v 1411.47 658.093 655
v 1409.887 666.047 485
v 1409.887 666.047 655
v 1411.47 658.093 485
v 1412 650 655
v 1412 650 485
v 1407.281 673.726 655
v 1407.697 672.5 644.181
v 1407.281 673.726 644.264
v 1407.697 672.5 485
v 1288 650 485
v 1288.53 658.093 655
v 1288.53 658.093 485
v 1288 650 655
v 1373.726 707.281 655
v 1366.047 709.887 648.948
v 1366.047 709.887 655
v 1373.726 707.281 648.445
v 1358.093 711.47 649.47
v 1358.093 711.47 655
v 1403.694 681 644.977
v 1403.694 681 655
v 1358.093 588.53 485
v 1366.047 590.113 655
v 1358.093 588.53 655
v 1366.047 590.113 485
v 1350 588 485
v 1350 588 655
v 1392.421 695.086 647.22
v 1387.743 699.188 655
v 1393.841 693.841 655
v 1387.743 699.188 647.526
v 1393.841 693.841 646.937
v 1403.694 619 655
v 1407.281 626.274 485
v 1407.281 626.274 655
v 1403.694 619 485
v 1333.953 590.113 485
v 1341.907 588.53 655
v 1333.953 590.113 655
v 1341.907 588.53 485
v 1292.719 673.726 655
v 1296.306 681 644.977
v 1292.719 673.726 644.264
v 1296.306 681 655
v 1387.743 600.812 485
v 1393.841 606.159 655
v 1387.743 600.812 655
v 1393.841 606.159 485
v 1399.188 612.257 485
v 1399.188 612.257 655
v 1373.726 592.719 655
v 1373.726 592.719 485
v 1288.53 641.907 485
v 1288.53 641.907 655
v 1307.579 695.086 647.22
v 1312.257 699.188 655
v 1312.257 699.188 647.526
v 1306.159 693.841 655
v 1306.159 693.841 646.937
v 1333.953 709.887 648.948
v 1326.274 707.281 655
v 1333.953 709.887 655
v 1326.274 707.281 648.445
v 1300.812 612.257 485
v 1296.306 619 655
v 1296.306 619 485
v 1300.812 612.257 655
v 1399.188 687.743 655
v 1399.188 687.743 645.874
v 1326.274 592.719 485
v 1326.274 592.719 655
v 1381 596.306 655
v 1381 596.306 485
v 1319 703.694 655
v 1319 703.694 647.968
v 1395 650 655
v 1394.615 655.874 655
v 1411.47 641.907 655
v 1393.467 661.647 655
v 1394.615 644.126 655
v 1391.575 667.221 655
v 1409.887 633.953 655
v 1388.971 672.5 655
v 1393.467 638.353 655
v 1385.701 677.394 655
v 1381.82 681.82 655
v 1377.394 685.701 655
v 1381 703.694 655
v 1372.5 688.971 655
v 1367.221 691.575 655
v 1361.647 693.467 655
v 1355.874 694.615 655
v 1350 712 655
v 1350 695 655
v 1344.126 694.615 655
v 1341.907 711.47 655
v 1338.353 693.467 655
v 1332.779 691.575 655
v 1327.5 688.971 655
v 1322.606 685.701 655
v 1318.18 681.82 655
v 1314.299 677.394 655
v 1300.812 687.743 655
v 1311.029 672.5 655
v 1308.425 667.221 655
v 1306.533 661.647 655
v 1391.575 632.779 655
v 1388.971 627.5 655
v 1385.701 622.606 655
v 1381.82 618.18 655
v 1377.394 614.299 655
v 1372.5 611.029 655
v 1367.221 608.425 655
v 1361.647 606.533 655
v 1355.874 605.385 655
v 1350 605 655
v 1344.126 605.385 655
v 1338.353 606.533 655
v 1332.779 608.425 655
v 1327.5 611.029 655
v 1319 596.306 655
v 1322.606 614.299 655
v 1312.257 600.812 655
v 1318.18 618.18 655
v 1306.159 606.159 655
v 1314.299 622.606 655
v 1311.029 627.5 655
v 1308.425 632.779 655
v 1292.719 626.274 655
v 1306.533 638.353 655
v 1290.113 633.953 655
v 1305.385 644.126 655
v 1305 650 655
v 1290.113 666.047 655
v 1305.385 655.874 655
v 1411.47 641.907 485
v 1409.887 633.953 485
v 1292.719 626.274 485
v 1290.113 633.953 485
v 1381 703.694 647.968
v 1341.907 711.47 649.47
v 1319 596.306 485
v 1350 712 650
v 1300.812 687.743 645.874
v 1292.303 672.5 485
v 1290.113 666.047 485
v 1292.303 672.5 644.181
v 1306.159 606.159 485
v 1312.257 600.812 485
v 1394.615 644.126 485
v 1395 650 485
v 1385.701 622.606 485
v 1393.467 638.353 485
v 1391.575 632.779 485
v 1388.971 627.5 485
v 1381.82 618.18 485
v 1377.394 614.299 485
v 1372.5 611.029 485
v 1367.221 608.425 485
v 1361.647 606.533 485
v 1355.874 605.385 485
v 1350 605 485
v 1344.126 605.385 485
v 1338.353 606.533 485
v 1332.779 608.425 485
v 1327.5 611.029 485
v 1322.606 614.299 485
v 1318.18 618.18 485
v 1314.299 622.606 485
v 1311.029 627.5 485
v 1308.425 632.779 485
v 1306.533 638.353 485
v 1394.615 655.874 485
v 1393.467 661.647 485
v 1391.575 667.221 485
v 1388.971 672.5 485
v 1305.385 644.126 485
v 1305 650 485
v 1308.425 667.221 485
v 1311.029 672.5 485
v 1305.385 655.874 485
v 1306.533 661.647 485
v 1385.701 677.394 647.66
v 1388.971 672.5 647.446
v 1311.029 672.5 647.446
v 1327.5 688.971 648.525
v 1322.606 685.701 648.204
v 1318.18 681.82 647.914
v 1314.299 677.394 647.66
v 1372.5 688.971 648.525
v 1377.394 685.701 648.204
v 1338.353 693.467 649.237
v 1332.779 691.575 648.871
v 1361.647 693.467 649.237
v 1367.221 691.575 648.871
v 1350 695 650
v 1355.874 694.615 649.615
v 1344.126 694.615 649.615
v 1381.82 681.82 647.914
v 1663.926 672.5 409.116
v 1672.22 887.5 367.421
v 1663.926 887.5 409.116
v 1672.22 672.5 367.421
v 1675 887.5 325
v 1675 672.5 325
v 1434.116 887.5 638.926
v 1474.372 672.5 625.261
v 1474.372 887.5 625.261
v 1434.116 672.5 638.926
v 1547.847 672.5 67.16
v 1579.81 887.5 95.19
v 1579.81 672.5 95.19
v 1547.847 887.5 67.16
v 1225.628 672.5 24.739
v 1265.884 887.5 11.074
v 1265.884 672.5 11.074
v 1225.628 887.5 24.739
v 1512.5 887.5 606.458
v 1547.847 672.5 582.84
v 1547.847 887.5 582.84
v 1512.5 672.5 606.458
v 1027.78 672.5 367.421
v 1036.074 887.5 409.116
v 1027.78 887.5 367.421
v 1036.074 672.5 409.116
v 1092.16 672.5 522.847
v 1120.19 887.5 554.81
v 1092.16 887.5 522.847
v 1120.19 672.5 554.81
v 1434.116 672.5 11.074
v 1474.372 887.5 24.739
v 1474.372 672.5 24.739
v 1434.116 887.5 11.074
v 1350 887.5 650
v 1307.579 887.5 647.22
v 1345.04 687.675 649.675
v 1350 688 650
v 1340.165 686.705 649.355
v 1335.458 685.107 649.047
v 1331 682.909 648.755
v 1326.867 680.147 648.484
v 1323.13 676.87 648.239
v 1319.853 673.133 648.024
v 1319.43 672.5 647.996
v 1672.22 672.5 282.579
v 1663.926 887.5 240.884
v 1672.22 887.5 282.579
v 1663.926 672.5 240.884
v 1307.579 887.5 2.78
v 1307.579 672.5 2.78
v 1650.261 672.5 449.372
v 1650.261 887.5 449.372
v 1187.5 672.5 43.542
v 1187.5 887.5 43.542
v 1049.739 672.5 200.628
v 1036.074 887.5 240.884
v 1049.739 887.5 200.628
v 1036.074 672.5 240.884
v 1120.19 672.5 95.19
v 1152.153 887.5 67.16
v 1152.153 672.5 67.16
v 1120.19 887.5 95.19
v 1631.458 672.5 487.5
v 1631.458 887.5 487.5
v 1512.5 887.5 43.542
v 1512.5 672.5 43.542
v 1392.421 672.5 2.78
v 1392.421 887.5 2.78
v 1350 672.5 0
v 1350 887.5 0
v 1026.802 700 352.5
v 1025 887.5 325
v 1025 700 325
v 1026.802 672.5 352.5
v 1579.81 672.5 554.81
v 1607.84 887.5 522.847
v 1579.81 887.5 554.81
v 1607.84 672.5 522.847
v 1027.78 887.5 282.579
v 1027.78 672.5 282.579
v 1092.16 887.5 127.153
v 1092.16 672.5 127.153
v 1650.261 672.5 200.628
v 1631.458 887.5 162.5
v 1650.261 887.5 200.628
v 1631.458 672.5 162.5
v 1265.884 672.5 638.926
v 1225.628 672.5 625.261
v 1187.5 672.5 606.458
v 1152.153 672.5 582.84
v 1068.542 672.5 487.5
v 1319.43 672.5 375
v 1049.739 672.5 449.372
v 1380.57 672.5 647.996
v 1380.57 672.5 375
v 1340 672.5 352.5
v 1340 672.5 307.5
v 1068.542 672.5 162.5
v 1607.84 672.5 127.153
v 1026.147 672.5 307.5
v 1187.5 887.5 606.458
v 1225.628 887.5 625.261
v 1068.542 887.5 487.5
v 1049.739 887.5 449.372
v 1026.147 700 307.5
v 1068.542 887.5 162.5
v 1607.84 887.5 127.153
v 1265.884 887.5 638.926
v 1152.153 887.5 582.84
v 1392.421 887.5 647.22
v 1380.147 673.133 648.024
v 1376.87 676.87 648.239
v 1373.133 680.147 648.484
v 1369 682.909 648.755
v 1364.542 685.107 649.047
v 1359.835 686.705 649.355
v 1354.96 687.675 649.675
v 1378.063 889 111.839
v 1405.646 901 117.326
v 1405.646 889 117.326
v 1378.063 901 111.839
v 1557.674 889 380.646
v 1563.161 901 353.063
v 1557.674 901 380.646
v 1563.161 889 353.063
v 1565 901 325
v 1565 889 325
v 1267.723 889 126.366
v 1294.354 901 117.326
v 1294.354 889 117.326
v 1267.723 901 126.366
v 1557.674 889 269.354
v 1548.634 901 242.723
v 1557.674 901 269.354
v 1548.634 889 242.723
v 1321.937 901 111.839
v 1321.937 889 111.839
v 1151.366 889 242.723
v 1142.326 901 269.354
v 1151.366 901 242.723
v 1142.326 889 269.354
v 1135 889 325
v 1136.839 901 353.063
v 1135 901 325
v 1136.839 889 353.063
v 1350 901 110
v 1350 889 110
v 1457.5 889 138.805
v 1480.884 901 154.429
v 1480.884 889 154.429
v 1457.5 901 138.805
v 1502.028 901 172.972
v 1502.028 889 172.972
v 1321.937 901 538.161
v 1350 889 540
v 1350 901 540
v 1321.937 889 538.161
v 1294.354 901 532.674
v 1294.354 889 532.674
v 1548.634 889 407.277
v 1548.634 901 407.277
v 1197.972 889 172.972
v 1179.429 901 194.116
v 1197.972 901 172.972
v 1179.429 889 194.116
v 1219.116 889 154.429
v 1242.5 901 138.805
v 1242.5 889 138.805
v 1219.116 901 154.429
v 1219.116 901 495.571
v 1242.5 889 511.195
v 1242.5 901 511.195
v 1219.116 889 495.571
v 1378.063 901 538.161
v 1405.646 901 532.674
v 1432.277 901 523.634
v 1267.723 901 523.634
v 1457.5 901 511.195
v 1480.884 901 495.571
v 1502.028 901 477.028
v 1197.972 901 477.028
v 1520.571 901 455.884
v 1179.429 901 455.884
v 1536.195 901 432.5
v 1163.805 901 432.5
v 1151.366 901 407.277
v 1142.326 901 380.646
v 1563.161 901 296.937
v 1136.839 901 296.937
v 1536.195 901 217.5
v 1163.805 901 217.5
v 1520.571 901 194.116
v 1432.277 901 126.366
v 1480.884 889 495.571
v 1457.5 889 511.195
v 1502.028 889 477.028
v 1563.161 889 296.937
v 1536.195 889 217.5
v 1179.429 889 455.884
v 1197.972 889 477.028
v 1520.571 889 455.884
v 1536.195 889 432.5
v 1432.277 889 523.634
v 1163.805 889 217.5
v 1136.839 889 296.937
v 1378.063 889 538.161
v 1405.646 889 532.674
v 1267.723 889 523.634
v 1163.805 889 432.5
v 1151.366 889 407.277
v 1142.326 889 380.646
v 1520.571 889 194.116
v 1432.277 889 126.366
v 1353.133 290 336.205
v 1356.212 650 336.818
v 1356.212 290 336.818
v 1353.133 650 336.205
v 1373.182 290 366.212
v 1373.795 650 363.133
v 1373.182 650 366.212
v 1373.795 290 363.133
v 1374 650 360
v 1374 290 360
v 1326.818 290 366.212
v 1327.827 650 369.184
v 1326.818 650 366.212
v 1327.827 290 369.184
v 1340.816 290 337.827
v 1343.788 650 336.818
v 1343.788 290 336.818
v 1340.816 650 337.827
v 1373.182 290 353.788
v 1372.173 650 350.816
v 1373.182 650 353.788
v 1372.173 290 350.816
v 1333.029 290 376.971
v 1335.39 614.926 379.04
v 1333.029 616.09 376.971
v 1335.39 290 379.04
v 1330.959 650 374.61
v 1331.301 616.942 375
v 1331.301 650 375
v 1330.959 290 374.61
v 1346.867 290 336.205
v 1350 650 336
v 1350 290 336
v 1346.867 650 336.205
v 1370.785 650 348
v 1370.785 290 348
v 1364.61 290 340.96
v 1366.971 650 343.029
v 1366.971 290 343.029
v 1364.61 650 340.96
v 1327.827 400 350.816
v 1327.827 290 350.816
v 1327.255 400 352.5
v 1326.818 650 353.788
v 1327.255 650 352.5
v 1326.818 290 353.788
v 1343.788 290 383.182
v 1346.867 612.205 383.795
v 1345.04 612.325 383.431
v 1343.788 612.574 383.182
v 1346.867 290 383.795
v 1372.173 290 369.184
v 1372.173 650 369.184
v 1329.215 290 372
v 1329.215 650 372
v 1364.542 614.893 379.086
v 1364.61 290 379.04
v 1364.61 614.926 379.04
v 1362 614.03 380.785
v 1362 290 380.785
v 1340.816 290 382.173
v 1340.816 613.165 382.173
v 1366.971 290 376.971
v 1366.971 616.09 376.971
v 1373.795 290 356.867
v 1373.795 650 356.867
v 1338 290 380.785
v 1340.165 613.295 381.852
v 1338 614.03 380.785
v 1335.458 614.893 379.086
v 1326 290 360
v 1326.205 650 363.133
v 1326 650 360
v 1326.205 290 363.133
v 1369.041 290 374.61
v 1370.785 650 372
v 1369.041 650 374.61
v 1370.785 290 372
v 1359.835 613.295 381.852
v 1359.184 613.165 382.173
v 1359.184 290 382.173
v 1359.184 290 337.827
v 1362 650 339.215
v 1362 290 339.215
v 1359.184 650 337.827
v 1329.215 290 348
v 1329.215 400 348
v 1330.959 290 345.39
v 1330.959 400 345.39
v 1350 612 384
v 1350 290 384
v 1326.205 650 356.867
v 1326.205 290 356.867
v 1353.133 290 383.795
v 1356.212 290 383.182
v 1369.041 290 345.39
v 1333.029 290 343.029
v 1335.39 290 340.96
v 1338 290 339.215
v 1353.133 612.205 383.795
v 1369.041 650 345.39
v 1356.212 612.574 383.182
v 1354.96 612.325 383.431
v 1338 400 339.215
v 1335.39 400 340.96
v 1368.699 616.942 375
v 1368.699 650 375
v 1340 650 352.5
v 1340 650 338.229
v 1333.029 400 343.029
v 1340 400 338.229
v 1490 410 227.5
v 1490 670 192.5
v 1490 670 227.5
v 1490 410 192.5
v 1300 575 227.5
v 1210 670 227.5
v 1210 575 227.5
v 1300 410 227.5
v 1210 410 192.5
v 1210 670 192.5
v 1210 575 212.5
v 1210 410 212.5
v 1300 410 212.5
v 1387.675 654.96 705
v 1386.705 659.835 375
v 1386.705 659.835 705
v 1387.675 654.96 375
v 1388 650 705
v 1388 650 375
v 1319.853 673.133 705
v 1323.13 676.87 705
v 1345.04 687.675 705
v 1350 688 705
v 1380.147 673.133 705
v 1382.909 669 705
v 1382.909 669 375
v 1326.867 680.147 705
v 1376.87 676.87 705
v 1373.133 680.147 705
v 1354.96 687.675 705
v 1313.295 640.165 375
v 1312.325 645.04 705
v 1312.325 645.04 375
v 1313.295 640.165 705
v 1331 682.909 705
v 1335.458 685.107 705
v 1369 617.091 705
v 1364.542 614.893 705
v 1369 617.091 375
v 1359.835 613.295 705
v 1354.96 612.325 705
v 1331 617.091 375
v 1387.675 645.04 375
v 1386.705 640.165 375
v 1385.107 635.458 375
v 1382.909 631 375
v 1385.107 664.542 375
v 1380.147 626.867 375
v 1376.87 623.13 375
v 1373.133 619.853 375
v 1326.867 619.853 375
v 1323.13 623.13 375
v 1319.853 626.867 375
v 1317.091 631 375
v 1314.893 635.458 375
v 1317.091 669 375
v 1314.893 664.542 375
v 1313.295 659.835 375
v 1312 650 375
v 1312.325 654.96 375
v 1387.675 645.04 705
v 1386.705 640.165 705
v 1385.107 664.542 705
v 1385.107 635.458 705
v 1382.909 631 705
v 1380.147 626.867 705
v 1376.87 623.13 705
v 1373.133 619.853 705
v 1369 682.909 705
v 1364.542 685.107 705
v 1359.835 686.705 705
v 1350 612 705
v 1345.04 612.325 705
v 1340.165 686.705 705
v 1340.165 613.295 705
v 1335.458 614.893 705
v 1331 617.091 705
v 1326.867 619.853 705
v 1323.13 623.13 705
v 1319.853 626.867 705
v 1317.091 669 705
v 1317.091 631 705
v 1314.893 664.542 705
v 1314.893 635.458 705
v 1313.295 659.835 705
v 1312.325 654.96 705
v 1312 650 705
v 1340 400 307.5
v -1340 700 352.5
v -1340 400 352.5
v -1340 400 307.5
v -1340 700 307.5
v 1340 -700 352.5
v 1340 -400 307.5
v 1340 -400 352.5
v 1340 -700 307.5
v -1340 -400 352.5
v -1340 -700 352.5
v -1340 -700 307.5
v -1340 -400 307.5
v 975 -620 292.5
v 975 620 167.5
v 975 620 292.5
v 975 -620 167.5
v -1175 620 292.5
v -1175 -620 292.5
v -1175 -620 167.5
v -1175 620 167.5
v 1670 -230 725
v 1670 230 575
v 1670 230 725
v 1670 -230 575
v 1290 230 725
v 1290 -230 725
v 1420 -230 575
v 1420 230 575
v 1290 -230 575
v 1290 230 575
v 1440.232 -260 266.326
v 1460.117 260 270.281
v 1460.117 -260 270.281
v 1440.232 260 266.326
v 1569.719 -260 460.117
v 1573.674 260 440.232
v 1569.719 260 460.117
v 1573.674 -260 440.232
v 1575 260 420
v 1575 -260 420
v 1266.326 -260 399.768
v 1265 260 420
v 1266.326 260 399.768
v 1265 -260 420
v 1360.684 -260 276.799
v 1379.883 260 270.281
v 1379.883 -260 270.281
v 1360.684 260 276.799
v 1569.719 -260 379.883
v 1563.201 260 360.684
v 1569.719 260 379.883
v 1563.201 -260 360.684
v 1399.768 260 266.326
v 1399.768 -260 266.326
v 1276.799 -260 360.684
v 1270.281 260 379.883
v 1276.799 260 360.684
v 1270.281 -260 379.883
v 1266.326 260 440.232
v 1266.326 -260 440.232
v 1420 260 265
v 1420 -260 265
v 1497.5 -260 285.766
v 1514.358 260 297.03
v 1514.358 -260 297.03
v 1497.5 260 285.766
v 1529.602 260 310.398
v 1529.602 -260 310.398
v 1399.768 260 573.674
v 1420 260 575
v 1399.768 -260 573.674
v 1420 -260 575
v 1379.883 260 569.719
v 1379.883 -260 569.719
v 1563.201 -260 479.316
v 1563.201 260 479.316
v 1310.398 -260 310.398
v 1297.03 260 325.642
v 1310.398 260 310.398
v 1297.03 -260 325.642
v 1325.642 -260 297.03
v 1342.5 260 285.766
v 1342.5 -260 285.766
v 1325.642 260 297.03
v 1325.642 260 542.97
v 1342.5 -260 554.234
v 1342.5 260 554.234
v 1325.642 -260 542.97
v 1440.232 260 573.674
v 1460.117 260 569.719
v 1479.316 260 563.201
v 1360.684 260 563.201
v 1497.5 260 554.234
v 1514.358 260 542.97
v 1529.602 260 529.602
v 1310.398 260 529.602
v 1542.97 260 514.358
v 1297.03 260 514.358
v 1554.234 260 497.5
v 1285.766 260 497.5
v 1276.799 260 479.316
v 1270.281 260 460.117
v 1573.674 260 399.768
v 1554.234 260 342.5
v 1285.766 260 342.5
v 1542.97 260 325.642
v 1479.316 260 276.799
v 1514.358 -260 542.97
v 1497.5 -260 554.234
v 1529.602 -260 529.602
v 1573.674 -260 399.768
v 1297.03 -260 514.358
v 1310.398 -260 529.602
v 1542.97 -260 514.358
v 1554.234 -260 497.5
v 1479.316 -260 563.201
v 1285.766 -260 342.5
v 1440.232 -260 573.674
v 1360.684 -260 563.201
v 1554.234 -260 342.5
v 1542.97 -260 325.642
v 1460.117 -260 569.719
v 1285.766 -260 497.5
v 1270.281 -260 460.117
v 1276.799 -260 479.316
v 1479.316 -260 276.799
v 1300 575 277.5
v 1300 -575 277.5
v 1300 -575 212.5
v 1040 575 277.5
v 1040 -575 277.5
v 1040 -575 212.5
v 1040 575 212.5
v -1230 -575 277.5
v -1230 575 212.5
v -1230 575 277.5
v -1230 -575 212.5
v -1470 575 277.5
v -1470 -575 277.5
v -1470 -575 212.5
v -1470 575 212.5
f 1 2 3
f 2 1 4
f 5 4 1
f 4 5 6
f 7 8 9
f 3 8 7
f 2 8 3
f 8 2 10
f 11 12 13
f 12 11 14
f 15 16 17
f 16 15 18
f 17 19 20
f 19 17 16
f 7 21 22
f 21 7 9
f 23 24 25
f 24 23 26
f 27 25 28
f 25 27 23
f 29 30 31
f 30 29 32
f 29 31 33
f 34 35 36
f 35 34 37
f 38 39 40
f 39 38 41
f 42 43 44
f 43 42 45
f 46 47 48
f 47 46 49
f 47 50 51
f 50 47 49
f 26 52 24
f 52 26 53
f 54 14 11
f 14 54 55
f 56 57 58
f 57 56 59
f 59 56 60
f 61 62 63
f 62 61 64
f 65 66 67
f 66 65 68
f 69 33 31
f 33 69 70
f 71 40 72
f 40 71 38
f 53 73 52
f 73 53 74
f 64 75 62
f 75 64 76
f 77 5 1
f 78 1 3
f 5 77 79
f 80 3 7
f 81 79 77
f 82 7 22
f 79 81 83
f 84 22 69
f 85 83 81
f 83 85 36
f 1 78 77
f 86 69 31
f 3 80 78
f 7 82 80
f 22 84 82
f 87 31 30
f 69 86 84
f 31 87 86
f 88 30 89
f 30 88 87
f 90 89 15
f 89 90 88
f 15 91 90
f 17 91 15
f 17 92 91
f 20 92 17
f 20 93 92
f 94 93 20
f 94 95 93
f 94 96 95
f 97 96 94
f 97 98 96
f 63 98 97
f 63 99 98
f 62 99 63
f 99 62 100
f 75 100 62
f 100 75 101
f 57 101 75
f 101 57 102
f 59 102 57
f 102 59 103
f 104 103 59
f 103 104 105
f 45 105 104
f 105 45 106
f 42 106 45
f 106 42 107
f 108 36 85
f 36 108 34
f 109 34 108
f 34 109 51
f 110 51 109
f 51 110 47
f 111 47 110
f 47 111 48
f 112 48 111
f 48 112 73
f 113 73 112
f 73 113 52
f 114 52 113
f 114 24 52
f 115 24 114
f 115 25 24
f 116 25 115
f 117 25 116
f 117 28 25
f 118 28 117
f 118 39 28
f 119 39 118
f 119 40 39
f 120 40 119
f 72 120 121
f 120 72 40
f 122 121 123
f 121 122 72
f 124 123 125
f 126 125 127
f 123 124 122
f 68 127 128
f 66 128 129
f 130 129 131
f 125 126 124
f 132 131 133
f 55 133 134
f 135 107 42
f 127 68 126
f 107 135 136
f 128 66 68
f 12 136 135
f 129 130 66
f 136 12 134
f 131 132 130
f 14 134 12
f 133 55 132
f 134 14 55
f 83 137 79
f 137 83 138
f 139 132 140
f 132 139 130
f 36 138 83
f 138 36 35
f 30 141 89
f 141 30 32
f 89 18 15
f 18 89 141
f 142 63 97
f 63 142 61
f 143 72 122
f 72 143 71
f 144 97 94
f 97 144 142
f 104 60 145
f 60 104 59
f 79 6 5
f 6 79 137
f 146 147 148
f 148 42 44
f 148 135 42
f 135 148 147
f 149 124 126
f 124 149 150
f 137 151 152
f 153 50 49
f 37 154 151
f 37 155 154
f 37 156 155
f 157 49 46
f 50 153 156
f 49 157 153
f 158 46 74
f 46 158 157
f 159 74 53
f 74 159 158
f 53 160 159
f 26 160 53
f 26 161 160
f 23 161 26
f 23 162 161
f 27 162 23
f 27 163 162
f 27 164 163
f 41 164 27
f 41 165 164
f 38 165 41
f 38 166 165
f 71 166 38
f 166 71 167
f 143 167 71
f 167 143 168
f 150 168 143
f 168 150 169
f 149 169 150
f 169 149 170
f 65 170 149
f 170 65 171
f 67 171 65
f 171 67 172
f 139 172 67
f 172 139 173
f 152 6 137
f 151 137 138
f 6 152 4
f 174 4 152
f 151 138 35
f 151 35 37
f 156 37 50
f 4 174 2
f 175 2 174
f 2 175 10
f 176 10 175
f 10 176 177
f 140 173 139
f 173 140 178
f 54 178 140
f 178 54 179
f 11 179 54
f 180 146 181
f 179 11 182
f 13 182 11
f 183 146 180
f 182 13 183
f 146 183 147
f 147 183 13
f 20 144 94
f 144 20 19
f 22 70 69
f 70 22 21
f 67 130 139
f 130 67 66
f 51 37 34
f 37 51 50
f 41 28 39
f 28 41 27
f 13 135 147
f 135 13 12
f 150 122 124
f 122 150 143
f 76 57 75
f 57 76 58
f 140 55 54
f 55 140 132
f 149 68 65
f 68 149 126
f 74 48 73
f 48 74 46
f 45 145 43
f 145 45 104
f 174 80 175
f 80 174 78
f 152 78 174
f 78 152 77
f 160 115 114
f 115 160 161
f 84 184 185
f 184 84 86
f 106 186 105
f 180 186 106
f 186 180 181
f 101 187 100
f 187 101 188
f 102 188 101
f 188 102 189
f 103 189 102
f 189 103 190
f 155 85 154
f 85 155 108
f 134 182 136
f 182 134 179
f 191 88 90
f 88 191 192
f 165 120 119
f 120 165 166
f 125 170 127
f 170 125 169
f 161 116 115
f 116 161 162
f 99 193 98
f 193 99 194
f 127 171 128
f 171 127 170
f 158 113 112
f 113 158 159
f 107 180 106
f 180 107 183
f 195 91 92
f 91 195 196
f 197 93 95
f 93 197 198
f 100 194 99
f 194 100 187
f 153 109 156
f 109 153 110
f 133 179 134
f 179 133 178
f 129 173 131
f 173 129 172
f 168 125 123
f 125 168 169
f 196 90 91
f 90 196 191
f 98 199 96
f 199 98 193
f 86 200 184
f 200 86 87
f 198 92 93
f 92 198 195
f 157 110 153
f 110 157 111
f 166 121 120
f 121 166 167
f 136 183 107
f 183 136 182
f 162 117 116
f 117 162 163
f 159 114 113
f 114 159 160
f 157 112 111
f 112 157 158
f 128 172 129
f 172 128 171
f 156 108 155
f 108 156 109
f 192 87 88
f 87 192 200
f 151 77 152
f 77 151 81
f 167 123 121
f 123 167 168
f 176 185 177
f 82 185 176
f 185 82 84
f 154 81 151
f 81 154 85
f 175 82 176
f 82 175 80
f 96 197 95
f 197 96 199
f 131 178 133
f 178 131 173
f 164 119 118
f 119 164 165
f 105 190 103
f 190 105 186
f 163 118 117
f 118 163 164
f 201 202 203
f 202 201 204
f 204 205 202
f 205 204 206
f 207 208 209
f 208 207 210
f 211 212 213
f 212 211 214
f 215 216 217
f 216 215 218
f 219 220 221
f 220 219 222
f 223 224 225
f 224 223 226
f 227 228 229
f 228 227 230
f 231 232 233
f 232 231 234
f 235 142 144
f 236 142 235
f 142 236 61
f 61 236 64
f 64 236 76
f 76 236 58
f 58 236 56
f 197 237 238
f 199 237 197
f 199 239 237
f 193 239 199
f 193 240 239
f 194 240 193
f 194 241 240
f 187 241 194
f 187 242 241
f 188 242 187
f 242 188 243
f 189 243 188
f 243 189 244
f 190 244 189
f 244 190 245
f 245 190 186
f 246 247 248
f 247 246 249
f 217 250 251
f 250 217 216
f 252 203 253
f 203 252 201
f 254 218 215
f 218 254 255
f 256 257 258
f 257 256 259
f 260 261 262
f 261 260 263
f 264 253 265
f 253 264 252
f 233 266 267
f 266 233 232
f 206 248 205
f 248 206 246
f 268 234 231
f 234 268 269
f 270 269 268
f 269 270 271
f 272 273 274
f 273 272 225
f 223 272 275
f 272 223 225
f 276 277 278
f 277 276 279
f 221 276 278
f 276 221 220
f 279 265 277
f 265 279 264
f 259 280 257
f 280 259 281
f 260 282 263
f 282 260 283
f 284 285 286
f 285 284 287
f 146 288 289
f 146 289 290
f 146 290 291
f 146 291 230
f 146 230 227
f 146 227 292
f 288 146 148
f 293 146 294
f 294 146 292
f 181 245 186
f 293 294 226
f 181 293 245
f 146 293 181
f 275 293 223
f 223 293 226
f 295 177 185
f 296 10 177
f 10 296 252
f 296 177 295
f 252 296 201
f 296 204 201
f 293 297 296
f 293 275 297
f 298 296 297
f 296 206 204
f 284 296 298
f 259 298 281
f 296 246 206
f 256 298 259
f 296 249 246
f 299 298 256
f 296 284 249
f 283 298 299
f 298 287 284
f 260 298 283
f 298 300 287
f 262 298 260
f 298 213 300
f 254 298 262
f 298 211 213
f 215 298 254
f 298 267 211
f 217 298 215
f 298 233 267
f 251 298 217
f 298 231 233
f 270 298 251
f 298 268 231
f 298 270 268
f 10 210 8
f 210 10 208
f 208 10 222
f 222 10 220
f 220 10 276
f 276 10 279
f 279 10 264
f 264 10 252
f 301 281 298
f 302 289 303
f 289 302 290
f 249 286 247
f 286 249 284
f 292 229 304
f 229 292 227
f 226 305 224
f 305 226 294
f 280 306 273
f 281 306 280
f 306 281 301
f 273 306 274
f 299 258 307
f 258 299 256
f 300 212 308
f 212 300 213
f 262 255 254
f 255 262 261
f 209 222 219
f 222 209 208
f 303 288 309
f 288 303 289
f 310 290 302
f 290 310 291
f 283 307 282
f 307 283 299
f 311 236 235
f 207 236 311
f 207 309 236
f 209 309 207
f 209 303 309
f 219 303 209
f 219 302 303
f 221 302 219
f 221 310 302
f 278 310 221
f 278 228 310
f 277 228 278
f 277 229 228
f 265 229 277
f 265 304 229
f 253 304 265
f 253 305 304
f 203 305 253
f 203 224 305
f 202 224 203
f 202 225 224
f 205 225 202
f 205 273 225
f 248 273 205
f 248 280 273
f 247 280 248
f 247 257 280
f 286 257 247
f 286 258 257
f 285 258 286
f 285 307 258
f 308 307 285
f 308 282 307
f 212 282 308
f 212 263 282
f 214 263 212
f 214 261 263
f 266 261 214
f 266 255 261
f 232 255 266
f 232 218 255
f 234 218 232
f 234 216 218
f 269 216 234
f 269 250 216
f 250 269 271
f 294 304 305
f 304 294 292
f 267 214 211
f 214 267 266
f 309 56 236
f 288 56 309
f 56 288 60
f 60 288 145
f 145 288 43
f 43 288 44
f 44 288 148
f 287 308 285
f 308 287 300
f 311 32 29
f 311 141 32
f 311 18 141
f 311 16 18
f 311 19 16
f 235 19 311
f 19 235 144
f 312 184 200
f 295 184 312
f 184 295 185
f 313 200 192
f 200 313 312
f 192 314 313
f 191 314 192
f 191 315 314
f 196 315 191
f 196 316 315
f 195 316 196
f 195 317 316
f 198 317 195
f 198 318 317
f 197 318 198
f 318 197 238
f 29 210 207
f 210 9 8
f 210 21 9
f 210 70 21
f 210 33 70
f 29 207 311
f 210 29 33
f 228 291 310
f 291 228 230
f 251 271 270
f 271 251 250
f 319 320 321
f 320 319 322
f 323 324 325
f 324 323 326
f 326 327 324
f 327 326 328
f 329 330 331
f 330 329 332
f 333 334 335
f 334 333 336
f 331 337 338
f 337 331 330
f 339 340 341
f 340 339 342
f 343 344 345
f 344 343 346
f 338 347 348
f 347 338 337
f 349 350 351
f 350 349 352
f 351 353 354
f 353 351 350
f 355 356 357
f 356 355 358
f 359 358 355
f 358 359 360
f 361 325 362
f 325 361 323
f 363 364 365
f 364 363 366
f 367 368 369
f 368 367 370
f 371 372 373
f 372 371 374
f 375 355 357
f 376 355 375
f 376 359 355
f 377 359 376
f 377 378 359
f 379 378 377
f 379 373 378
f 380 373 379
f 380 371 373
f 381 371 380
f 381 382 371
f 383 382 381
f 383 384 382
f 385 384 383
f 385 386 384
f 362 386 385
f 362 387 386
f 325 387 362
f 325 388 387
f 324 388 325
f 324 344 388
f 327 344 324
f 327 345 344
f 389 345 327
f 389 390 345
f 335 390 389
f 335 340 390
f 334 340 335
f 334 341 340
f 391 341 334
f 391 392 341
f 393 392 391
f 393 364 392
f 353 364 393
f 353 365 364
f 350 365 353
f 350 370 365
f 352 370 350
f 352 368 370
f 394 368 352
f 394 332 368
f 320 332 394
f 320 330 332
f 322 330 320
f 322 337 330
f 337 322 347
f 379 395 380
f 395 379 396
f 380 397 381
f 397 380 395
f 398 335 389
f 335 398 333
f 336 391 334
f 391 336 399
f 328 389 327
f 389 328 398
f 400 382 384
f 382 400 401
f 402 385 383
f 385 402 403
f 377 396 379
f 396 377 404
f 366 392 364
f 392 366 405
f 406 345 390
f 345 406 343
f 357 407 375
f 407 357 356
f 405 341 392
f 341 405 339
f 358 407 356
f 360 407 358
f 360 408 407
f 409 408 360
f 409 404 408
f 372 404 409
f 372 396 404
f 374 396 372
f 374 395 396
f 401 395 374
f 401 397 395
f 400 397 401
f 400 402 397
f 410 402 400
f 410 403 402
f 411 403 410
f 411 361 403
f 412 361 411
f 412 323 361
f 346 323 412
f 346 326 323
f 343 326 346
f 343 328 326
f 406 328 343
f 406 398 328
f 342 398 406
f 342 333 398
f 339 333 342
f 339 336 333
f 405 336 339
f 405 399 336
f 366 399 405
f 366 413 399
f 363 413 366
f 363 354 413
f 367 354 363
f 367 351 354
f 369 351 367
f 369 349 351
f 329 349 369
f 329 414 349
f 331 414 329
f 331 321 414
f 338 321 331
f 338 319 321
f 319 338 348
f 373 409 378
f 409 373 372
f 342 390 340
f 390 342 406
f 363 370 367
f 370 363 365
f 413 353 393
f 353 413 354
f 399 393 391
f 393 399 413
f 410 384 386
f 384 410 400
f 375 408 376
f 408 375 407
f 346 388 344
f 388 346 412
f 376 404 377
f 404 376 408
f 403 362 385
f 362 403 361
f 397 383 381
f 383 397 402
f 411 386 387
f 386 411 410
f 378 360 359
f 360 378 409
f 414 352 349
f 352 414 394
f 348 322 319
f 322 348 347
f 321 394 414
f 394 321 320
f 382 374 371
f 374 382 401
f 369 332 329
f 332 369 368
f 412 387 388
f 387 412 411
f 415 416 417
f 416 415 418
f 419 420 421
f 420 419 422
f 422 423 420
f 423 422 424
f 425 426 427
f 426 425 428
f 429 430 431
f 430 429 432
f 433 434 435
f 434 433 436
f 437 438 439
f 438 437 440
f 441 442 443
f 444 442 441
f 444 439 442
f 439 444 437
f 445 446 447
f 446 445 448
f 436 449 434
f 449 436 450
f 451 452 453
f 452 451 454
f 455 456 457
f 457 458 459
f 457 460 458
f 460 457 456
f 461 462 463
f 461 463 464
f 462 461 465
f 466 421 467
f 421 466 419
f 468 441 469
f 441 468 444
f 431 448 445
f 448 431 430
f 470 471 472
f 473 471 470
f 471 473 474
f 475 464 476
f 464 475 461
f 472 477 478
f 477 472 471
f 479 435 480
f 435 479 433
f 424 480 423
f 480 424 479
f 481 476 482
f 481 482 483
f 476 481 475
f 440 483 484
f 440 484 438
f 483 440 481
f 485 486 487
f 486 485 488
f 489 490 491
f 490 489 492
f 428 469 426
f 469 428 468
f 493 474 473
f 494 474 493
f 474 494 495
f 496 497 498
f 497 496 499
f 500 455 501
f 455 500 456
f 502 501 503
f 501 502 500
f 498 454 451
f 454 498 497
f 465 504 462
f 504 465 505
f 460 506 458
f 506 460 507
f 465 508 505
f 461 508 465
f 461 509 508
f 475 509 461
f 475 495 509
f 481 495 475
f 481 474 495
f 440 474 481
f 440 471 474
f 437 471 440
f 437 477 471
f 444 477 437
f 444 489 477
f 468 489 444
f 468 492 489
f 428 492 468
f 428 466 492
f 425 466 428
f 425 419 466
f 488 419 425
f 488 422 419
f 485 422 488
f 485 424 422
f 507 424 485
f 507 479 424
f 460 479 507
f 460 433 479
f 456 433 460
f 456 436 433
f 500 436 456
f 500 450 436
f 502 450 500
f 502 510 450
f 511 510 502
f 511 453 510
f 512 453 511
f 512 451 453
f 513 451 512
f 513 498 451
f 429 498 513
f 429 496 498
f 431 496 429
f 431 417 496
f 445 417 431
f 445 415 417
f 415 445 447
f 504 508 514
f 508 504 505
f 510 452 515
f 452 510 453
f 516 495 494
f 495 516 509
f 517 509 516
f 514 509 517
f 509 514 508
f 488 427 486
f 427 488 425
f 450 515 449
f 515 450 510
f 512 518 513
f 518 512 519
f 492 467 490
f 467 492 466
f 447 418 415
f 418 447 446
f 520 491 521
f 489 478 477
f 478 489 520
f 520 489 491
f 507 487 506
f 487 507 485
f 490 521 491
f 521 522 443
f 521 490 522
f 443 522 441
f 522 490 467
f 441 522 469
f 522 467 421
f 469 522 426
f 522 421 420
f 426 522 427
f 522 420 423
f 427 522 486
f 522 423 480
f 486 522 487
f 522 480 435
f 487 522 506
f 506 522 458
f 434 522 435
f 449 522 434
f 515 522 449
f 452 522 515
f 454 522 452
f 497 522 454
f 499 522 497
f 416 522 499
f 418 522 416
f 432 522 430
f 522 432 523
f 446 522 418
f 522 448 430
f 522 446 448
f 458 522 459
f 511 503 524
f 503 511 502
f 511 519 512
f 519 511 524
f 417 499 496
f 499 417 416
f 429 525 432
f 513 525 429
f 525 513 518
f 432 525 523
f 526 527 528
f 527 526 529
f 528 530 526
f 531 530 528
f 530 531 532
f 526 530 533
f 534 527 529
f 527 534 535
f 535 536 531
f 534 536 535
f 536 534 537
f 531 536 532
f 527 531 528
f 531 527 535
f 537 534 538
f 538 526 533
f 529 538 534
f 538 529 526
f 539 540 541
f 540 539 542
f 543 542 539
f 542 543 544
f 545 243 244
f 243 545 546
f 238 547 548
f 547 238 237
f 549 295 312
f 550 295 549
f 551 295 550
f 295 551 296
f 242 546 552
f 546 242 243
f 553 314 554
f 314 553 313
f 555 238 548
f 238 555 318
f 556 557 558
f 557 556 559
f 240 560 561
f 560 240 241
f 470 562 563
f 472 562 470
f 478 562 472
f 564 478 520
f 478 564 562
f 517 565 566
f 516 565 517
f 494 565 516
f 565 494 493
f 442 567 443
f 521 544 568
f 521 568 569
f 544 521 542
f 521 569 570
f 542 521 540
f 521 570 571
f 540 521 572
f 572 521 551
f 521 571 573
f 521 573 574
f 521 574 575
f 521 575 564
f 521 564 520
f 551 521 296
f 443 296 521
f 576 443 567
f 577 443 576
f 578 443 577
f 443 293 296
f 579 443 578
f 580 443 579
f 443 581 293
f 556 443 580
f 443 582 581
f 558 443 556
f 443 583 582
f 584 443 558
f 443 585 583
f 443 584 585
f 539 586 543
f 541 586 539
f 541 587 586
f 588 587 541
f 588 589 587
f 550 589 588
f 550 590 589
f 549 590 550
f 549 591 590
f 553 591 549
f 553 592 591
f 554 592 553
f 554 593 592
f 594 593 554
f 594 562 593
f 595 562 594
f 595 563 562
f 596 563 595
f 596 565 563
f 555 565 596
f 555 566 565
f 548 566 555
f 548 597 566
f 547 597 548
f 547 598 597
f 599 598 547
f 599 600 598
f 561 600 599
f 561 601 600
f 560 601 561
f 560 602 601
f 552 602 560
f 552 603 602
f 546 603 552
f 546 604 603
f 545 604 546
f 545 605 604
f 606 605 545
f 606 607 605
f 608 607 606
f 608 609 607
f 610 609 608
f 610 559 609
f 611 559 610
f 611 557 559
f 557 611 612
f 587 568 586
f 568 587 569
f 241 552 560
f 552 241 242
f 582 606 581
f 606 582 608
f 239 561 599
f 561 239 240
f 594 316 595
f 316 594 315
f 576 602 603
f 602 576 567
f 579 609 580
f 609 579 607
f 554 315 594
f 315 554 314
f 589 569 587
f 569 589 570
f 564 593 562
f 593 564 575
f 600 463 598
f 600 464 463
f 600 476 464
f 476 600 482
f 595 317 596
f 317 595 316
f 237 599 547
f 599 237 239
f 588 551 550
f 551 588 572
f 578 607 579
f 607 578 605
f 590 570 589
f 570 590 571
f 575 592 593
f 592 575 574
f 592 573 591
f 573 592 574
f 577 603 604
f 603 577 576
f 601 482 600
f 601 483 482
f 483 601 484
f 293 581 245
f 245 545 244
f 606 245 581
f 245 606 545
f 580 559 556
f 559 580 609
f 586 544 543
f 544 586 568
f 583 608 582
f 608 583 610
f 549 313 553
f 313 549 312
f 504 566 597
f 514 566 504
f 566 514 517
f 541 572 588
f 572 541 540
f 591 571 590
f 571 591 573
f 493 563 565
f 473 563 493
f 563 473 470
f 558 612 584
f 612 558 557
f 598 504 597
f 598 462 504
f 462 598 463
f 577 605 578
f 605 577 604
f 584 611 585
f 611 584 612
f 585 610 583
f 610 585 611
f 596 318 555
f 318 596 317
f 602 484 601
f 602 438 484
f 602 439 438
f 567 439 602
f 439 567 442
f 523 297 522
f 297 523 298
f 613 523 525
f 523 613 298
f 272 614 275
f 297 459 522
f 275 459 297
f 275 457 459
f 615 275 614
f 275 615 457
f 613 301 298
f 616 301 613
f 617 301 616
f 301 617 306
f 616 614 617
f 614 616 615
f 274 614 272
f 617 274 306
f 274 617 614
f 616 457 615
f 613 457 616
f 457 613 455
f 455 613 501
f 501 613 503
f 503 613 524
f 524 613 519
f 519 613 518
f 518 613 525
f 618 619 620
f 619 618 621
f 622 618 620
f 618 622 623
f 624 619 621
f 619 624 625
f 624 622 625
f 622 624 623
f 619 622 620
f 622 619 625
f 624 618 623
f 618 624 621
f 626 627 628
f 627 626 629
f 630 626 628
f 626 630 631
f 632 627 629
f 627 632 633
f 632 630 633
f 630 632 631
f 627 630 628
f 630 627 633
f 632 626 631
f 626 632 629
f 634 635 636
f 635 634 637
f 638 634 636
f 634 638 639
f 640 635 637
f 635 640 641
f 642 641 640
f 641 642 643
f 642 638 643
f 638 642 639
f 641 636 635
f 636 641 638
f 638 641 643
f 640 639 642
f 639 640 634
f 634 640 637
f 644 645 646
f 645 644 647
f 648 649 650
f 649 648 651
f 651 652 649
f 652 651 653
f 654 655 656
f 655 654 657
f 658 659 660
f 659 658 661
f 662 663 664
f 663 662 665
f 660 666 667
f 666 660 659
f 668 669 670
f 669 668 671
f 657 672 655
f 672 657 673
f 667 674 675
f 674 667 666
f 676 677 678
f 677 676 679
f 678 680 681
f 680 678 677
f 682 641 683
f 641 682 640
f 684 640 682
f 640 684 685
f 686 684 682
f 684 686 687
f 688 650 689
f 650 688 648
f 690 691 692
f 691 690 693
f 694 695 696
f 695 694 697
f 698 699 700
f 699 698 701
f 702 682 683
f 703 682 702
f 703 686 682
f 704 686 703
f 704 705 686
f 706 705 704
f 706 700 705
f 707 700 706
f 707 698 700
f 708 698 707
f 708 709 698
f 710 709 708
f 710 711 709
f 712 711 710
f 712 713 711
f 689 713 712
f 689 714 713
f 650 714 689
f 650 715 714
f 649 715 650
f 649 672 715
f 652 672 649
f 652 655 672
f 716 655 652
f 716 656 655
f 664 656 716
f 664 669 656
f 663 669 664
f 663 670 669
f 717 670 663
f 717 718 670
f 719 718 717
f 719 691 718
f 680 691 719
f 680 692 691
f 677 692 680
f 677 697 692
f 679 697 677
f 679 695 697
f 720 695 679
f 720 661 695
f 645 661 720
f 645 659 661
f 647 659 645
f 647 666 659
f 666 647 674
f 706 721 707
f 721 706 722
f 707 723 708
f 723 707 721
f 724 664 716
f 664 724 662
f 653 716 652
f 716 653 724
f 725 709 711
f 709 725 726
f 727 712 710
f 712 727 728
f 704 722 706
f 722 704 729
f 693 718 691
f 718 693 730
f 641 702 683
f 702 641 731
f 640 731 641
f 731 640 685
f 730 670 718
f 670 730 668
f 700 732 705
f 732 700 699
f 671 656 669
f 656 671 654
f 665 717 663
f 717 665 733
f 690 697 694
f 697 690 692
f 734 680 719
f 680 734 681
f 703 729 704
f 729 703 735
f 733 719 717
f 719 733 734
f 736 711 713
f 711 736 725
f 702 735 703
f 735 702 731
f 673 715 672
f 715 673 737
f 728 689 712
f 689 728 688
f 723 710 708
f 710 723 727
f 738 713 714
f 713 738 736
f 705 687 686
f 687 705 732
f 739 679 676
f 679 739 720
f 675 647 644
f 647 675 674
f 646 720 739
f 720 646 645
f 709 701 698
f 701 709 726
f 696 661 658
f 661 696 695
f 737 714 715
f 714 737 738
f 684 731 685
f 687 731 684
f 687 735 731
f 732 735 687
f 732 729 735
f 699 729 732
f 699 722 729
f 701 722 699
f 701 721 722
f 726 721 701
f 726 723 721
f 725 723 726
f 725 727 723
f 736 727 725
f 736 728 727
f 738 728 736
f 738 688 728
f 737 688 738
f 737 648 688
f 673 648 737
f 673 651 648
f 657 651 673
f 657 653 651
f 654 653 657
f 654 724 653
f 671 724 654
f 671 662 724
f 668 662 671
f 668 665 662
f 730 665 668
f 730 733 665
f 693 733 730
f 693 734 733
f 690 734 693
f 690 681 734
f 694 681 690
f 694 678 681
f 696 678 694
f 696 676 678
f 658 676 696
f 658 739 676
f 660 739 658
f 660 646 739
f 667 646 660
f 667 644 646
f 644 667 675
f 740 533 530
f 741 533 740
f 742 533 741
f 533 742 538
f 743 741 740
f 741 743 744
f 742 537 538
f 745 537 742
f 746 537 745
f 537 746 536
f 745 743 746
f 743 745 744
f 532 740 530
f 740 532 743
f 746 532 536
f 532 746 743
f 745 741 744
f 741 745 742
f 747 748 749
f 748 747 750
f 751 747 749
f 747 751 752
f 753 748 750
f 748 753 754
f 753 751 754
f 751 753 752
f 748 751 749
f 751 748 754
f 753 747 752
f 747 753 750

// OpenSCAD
// ElectricSedan concept geometry. Units: mm; +X front; +Z up; ground z=0.
$fn=48;
module box(p,s,c){color(c) translate(p) cube(s,center=true);}
module cyl(p,r,h,c){color(c) translate(p) rotate([90,0,0]) cylinder(r=r,h=h,center=true);}
box([0,550,330],[2680,300,45],"SlateGray");
box([0,-550,330],[2680,300,45],"SlateGray");
box([-100,0,230],[2150,1240,125],"Goldenrod");
box([1480,0,650],[380,460,150],"CadetBlue");
cyl([1420,0,420],155,520,"Peru");
box([1170,0,245],[260,1150,65],"SlateGray");
box([-1350,0,245],[240,1150,65],"SlateGray");
module corner(x,y){
 cyl([x,y,325],325,215,"#20252B");
 cyl([x,y+sign(y)*115,325],215,12,"#B9C6D0");
 cyl([x,sign(y)*470,360],24,360,"#B9C6D0");
 box([x,sign(y)*540,210],[280,260,35],"SlateGray");
 color("#B9C6D0") translate([x,sign(y)*650,540]) cylinder(r=38,h=330,center=true);
 color("Goldenrod") translate([x,sign(y)*650,570]) difference(){cylinder(r=62,h=170,center=true); cylinder(r=45,h=172,center=true);}
}
corner(1350,780);
